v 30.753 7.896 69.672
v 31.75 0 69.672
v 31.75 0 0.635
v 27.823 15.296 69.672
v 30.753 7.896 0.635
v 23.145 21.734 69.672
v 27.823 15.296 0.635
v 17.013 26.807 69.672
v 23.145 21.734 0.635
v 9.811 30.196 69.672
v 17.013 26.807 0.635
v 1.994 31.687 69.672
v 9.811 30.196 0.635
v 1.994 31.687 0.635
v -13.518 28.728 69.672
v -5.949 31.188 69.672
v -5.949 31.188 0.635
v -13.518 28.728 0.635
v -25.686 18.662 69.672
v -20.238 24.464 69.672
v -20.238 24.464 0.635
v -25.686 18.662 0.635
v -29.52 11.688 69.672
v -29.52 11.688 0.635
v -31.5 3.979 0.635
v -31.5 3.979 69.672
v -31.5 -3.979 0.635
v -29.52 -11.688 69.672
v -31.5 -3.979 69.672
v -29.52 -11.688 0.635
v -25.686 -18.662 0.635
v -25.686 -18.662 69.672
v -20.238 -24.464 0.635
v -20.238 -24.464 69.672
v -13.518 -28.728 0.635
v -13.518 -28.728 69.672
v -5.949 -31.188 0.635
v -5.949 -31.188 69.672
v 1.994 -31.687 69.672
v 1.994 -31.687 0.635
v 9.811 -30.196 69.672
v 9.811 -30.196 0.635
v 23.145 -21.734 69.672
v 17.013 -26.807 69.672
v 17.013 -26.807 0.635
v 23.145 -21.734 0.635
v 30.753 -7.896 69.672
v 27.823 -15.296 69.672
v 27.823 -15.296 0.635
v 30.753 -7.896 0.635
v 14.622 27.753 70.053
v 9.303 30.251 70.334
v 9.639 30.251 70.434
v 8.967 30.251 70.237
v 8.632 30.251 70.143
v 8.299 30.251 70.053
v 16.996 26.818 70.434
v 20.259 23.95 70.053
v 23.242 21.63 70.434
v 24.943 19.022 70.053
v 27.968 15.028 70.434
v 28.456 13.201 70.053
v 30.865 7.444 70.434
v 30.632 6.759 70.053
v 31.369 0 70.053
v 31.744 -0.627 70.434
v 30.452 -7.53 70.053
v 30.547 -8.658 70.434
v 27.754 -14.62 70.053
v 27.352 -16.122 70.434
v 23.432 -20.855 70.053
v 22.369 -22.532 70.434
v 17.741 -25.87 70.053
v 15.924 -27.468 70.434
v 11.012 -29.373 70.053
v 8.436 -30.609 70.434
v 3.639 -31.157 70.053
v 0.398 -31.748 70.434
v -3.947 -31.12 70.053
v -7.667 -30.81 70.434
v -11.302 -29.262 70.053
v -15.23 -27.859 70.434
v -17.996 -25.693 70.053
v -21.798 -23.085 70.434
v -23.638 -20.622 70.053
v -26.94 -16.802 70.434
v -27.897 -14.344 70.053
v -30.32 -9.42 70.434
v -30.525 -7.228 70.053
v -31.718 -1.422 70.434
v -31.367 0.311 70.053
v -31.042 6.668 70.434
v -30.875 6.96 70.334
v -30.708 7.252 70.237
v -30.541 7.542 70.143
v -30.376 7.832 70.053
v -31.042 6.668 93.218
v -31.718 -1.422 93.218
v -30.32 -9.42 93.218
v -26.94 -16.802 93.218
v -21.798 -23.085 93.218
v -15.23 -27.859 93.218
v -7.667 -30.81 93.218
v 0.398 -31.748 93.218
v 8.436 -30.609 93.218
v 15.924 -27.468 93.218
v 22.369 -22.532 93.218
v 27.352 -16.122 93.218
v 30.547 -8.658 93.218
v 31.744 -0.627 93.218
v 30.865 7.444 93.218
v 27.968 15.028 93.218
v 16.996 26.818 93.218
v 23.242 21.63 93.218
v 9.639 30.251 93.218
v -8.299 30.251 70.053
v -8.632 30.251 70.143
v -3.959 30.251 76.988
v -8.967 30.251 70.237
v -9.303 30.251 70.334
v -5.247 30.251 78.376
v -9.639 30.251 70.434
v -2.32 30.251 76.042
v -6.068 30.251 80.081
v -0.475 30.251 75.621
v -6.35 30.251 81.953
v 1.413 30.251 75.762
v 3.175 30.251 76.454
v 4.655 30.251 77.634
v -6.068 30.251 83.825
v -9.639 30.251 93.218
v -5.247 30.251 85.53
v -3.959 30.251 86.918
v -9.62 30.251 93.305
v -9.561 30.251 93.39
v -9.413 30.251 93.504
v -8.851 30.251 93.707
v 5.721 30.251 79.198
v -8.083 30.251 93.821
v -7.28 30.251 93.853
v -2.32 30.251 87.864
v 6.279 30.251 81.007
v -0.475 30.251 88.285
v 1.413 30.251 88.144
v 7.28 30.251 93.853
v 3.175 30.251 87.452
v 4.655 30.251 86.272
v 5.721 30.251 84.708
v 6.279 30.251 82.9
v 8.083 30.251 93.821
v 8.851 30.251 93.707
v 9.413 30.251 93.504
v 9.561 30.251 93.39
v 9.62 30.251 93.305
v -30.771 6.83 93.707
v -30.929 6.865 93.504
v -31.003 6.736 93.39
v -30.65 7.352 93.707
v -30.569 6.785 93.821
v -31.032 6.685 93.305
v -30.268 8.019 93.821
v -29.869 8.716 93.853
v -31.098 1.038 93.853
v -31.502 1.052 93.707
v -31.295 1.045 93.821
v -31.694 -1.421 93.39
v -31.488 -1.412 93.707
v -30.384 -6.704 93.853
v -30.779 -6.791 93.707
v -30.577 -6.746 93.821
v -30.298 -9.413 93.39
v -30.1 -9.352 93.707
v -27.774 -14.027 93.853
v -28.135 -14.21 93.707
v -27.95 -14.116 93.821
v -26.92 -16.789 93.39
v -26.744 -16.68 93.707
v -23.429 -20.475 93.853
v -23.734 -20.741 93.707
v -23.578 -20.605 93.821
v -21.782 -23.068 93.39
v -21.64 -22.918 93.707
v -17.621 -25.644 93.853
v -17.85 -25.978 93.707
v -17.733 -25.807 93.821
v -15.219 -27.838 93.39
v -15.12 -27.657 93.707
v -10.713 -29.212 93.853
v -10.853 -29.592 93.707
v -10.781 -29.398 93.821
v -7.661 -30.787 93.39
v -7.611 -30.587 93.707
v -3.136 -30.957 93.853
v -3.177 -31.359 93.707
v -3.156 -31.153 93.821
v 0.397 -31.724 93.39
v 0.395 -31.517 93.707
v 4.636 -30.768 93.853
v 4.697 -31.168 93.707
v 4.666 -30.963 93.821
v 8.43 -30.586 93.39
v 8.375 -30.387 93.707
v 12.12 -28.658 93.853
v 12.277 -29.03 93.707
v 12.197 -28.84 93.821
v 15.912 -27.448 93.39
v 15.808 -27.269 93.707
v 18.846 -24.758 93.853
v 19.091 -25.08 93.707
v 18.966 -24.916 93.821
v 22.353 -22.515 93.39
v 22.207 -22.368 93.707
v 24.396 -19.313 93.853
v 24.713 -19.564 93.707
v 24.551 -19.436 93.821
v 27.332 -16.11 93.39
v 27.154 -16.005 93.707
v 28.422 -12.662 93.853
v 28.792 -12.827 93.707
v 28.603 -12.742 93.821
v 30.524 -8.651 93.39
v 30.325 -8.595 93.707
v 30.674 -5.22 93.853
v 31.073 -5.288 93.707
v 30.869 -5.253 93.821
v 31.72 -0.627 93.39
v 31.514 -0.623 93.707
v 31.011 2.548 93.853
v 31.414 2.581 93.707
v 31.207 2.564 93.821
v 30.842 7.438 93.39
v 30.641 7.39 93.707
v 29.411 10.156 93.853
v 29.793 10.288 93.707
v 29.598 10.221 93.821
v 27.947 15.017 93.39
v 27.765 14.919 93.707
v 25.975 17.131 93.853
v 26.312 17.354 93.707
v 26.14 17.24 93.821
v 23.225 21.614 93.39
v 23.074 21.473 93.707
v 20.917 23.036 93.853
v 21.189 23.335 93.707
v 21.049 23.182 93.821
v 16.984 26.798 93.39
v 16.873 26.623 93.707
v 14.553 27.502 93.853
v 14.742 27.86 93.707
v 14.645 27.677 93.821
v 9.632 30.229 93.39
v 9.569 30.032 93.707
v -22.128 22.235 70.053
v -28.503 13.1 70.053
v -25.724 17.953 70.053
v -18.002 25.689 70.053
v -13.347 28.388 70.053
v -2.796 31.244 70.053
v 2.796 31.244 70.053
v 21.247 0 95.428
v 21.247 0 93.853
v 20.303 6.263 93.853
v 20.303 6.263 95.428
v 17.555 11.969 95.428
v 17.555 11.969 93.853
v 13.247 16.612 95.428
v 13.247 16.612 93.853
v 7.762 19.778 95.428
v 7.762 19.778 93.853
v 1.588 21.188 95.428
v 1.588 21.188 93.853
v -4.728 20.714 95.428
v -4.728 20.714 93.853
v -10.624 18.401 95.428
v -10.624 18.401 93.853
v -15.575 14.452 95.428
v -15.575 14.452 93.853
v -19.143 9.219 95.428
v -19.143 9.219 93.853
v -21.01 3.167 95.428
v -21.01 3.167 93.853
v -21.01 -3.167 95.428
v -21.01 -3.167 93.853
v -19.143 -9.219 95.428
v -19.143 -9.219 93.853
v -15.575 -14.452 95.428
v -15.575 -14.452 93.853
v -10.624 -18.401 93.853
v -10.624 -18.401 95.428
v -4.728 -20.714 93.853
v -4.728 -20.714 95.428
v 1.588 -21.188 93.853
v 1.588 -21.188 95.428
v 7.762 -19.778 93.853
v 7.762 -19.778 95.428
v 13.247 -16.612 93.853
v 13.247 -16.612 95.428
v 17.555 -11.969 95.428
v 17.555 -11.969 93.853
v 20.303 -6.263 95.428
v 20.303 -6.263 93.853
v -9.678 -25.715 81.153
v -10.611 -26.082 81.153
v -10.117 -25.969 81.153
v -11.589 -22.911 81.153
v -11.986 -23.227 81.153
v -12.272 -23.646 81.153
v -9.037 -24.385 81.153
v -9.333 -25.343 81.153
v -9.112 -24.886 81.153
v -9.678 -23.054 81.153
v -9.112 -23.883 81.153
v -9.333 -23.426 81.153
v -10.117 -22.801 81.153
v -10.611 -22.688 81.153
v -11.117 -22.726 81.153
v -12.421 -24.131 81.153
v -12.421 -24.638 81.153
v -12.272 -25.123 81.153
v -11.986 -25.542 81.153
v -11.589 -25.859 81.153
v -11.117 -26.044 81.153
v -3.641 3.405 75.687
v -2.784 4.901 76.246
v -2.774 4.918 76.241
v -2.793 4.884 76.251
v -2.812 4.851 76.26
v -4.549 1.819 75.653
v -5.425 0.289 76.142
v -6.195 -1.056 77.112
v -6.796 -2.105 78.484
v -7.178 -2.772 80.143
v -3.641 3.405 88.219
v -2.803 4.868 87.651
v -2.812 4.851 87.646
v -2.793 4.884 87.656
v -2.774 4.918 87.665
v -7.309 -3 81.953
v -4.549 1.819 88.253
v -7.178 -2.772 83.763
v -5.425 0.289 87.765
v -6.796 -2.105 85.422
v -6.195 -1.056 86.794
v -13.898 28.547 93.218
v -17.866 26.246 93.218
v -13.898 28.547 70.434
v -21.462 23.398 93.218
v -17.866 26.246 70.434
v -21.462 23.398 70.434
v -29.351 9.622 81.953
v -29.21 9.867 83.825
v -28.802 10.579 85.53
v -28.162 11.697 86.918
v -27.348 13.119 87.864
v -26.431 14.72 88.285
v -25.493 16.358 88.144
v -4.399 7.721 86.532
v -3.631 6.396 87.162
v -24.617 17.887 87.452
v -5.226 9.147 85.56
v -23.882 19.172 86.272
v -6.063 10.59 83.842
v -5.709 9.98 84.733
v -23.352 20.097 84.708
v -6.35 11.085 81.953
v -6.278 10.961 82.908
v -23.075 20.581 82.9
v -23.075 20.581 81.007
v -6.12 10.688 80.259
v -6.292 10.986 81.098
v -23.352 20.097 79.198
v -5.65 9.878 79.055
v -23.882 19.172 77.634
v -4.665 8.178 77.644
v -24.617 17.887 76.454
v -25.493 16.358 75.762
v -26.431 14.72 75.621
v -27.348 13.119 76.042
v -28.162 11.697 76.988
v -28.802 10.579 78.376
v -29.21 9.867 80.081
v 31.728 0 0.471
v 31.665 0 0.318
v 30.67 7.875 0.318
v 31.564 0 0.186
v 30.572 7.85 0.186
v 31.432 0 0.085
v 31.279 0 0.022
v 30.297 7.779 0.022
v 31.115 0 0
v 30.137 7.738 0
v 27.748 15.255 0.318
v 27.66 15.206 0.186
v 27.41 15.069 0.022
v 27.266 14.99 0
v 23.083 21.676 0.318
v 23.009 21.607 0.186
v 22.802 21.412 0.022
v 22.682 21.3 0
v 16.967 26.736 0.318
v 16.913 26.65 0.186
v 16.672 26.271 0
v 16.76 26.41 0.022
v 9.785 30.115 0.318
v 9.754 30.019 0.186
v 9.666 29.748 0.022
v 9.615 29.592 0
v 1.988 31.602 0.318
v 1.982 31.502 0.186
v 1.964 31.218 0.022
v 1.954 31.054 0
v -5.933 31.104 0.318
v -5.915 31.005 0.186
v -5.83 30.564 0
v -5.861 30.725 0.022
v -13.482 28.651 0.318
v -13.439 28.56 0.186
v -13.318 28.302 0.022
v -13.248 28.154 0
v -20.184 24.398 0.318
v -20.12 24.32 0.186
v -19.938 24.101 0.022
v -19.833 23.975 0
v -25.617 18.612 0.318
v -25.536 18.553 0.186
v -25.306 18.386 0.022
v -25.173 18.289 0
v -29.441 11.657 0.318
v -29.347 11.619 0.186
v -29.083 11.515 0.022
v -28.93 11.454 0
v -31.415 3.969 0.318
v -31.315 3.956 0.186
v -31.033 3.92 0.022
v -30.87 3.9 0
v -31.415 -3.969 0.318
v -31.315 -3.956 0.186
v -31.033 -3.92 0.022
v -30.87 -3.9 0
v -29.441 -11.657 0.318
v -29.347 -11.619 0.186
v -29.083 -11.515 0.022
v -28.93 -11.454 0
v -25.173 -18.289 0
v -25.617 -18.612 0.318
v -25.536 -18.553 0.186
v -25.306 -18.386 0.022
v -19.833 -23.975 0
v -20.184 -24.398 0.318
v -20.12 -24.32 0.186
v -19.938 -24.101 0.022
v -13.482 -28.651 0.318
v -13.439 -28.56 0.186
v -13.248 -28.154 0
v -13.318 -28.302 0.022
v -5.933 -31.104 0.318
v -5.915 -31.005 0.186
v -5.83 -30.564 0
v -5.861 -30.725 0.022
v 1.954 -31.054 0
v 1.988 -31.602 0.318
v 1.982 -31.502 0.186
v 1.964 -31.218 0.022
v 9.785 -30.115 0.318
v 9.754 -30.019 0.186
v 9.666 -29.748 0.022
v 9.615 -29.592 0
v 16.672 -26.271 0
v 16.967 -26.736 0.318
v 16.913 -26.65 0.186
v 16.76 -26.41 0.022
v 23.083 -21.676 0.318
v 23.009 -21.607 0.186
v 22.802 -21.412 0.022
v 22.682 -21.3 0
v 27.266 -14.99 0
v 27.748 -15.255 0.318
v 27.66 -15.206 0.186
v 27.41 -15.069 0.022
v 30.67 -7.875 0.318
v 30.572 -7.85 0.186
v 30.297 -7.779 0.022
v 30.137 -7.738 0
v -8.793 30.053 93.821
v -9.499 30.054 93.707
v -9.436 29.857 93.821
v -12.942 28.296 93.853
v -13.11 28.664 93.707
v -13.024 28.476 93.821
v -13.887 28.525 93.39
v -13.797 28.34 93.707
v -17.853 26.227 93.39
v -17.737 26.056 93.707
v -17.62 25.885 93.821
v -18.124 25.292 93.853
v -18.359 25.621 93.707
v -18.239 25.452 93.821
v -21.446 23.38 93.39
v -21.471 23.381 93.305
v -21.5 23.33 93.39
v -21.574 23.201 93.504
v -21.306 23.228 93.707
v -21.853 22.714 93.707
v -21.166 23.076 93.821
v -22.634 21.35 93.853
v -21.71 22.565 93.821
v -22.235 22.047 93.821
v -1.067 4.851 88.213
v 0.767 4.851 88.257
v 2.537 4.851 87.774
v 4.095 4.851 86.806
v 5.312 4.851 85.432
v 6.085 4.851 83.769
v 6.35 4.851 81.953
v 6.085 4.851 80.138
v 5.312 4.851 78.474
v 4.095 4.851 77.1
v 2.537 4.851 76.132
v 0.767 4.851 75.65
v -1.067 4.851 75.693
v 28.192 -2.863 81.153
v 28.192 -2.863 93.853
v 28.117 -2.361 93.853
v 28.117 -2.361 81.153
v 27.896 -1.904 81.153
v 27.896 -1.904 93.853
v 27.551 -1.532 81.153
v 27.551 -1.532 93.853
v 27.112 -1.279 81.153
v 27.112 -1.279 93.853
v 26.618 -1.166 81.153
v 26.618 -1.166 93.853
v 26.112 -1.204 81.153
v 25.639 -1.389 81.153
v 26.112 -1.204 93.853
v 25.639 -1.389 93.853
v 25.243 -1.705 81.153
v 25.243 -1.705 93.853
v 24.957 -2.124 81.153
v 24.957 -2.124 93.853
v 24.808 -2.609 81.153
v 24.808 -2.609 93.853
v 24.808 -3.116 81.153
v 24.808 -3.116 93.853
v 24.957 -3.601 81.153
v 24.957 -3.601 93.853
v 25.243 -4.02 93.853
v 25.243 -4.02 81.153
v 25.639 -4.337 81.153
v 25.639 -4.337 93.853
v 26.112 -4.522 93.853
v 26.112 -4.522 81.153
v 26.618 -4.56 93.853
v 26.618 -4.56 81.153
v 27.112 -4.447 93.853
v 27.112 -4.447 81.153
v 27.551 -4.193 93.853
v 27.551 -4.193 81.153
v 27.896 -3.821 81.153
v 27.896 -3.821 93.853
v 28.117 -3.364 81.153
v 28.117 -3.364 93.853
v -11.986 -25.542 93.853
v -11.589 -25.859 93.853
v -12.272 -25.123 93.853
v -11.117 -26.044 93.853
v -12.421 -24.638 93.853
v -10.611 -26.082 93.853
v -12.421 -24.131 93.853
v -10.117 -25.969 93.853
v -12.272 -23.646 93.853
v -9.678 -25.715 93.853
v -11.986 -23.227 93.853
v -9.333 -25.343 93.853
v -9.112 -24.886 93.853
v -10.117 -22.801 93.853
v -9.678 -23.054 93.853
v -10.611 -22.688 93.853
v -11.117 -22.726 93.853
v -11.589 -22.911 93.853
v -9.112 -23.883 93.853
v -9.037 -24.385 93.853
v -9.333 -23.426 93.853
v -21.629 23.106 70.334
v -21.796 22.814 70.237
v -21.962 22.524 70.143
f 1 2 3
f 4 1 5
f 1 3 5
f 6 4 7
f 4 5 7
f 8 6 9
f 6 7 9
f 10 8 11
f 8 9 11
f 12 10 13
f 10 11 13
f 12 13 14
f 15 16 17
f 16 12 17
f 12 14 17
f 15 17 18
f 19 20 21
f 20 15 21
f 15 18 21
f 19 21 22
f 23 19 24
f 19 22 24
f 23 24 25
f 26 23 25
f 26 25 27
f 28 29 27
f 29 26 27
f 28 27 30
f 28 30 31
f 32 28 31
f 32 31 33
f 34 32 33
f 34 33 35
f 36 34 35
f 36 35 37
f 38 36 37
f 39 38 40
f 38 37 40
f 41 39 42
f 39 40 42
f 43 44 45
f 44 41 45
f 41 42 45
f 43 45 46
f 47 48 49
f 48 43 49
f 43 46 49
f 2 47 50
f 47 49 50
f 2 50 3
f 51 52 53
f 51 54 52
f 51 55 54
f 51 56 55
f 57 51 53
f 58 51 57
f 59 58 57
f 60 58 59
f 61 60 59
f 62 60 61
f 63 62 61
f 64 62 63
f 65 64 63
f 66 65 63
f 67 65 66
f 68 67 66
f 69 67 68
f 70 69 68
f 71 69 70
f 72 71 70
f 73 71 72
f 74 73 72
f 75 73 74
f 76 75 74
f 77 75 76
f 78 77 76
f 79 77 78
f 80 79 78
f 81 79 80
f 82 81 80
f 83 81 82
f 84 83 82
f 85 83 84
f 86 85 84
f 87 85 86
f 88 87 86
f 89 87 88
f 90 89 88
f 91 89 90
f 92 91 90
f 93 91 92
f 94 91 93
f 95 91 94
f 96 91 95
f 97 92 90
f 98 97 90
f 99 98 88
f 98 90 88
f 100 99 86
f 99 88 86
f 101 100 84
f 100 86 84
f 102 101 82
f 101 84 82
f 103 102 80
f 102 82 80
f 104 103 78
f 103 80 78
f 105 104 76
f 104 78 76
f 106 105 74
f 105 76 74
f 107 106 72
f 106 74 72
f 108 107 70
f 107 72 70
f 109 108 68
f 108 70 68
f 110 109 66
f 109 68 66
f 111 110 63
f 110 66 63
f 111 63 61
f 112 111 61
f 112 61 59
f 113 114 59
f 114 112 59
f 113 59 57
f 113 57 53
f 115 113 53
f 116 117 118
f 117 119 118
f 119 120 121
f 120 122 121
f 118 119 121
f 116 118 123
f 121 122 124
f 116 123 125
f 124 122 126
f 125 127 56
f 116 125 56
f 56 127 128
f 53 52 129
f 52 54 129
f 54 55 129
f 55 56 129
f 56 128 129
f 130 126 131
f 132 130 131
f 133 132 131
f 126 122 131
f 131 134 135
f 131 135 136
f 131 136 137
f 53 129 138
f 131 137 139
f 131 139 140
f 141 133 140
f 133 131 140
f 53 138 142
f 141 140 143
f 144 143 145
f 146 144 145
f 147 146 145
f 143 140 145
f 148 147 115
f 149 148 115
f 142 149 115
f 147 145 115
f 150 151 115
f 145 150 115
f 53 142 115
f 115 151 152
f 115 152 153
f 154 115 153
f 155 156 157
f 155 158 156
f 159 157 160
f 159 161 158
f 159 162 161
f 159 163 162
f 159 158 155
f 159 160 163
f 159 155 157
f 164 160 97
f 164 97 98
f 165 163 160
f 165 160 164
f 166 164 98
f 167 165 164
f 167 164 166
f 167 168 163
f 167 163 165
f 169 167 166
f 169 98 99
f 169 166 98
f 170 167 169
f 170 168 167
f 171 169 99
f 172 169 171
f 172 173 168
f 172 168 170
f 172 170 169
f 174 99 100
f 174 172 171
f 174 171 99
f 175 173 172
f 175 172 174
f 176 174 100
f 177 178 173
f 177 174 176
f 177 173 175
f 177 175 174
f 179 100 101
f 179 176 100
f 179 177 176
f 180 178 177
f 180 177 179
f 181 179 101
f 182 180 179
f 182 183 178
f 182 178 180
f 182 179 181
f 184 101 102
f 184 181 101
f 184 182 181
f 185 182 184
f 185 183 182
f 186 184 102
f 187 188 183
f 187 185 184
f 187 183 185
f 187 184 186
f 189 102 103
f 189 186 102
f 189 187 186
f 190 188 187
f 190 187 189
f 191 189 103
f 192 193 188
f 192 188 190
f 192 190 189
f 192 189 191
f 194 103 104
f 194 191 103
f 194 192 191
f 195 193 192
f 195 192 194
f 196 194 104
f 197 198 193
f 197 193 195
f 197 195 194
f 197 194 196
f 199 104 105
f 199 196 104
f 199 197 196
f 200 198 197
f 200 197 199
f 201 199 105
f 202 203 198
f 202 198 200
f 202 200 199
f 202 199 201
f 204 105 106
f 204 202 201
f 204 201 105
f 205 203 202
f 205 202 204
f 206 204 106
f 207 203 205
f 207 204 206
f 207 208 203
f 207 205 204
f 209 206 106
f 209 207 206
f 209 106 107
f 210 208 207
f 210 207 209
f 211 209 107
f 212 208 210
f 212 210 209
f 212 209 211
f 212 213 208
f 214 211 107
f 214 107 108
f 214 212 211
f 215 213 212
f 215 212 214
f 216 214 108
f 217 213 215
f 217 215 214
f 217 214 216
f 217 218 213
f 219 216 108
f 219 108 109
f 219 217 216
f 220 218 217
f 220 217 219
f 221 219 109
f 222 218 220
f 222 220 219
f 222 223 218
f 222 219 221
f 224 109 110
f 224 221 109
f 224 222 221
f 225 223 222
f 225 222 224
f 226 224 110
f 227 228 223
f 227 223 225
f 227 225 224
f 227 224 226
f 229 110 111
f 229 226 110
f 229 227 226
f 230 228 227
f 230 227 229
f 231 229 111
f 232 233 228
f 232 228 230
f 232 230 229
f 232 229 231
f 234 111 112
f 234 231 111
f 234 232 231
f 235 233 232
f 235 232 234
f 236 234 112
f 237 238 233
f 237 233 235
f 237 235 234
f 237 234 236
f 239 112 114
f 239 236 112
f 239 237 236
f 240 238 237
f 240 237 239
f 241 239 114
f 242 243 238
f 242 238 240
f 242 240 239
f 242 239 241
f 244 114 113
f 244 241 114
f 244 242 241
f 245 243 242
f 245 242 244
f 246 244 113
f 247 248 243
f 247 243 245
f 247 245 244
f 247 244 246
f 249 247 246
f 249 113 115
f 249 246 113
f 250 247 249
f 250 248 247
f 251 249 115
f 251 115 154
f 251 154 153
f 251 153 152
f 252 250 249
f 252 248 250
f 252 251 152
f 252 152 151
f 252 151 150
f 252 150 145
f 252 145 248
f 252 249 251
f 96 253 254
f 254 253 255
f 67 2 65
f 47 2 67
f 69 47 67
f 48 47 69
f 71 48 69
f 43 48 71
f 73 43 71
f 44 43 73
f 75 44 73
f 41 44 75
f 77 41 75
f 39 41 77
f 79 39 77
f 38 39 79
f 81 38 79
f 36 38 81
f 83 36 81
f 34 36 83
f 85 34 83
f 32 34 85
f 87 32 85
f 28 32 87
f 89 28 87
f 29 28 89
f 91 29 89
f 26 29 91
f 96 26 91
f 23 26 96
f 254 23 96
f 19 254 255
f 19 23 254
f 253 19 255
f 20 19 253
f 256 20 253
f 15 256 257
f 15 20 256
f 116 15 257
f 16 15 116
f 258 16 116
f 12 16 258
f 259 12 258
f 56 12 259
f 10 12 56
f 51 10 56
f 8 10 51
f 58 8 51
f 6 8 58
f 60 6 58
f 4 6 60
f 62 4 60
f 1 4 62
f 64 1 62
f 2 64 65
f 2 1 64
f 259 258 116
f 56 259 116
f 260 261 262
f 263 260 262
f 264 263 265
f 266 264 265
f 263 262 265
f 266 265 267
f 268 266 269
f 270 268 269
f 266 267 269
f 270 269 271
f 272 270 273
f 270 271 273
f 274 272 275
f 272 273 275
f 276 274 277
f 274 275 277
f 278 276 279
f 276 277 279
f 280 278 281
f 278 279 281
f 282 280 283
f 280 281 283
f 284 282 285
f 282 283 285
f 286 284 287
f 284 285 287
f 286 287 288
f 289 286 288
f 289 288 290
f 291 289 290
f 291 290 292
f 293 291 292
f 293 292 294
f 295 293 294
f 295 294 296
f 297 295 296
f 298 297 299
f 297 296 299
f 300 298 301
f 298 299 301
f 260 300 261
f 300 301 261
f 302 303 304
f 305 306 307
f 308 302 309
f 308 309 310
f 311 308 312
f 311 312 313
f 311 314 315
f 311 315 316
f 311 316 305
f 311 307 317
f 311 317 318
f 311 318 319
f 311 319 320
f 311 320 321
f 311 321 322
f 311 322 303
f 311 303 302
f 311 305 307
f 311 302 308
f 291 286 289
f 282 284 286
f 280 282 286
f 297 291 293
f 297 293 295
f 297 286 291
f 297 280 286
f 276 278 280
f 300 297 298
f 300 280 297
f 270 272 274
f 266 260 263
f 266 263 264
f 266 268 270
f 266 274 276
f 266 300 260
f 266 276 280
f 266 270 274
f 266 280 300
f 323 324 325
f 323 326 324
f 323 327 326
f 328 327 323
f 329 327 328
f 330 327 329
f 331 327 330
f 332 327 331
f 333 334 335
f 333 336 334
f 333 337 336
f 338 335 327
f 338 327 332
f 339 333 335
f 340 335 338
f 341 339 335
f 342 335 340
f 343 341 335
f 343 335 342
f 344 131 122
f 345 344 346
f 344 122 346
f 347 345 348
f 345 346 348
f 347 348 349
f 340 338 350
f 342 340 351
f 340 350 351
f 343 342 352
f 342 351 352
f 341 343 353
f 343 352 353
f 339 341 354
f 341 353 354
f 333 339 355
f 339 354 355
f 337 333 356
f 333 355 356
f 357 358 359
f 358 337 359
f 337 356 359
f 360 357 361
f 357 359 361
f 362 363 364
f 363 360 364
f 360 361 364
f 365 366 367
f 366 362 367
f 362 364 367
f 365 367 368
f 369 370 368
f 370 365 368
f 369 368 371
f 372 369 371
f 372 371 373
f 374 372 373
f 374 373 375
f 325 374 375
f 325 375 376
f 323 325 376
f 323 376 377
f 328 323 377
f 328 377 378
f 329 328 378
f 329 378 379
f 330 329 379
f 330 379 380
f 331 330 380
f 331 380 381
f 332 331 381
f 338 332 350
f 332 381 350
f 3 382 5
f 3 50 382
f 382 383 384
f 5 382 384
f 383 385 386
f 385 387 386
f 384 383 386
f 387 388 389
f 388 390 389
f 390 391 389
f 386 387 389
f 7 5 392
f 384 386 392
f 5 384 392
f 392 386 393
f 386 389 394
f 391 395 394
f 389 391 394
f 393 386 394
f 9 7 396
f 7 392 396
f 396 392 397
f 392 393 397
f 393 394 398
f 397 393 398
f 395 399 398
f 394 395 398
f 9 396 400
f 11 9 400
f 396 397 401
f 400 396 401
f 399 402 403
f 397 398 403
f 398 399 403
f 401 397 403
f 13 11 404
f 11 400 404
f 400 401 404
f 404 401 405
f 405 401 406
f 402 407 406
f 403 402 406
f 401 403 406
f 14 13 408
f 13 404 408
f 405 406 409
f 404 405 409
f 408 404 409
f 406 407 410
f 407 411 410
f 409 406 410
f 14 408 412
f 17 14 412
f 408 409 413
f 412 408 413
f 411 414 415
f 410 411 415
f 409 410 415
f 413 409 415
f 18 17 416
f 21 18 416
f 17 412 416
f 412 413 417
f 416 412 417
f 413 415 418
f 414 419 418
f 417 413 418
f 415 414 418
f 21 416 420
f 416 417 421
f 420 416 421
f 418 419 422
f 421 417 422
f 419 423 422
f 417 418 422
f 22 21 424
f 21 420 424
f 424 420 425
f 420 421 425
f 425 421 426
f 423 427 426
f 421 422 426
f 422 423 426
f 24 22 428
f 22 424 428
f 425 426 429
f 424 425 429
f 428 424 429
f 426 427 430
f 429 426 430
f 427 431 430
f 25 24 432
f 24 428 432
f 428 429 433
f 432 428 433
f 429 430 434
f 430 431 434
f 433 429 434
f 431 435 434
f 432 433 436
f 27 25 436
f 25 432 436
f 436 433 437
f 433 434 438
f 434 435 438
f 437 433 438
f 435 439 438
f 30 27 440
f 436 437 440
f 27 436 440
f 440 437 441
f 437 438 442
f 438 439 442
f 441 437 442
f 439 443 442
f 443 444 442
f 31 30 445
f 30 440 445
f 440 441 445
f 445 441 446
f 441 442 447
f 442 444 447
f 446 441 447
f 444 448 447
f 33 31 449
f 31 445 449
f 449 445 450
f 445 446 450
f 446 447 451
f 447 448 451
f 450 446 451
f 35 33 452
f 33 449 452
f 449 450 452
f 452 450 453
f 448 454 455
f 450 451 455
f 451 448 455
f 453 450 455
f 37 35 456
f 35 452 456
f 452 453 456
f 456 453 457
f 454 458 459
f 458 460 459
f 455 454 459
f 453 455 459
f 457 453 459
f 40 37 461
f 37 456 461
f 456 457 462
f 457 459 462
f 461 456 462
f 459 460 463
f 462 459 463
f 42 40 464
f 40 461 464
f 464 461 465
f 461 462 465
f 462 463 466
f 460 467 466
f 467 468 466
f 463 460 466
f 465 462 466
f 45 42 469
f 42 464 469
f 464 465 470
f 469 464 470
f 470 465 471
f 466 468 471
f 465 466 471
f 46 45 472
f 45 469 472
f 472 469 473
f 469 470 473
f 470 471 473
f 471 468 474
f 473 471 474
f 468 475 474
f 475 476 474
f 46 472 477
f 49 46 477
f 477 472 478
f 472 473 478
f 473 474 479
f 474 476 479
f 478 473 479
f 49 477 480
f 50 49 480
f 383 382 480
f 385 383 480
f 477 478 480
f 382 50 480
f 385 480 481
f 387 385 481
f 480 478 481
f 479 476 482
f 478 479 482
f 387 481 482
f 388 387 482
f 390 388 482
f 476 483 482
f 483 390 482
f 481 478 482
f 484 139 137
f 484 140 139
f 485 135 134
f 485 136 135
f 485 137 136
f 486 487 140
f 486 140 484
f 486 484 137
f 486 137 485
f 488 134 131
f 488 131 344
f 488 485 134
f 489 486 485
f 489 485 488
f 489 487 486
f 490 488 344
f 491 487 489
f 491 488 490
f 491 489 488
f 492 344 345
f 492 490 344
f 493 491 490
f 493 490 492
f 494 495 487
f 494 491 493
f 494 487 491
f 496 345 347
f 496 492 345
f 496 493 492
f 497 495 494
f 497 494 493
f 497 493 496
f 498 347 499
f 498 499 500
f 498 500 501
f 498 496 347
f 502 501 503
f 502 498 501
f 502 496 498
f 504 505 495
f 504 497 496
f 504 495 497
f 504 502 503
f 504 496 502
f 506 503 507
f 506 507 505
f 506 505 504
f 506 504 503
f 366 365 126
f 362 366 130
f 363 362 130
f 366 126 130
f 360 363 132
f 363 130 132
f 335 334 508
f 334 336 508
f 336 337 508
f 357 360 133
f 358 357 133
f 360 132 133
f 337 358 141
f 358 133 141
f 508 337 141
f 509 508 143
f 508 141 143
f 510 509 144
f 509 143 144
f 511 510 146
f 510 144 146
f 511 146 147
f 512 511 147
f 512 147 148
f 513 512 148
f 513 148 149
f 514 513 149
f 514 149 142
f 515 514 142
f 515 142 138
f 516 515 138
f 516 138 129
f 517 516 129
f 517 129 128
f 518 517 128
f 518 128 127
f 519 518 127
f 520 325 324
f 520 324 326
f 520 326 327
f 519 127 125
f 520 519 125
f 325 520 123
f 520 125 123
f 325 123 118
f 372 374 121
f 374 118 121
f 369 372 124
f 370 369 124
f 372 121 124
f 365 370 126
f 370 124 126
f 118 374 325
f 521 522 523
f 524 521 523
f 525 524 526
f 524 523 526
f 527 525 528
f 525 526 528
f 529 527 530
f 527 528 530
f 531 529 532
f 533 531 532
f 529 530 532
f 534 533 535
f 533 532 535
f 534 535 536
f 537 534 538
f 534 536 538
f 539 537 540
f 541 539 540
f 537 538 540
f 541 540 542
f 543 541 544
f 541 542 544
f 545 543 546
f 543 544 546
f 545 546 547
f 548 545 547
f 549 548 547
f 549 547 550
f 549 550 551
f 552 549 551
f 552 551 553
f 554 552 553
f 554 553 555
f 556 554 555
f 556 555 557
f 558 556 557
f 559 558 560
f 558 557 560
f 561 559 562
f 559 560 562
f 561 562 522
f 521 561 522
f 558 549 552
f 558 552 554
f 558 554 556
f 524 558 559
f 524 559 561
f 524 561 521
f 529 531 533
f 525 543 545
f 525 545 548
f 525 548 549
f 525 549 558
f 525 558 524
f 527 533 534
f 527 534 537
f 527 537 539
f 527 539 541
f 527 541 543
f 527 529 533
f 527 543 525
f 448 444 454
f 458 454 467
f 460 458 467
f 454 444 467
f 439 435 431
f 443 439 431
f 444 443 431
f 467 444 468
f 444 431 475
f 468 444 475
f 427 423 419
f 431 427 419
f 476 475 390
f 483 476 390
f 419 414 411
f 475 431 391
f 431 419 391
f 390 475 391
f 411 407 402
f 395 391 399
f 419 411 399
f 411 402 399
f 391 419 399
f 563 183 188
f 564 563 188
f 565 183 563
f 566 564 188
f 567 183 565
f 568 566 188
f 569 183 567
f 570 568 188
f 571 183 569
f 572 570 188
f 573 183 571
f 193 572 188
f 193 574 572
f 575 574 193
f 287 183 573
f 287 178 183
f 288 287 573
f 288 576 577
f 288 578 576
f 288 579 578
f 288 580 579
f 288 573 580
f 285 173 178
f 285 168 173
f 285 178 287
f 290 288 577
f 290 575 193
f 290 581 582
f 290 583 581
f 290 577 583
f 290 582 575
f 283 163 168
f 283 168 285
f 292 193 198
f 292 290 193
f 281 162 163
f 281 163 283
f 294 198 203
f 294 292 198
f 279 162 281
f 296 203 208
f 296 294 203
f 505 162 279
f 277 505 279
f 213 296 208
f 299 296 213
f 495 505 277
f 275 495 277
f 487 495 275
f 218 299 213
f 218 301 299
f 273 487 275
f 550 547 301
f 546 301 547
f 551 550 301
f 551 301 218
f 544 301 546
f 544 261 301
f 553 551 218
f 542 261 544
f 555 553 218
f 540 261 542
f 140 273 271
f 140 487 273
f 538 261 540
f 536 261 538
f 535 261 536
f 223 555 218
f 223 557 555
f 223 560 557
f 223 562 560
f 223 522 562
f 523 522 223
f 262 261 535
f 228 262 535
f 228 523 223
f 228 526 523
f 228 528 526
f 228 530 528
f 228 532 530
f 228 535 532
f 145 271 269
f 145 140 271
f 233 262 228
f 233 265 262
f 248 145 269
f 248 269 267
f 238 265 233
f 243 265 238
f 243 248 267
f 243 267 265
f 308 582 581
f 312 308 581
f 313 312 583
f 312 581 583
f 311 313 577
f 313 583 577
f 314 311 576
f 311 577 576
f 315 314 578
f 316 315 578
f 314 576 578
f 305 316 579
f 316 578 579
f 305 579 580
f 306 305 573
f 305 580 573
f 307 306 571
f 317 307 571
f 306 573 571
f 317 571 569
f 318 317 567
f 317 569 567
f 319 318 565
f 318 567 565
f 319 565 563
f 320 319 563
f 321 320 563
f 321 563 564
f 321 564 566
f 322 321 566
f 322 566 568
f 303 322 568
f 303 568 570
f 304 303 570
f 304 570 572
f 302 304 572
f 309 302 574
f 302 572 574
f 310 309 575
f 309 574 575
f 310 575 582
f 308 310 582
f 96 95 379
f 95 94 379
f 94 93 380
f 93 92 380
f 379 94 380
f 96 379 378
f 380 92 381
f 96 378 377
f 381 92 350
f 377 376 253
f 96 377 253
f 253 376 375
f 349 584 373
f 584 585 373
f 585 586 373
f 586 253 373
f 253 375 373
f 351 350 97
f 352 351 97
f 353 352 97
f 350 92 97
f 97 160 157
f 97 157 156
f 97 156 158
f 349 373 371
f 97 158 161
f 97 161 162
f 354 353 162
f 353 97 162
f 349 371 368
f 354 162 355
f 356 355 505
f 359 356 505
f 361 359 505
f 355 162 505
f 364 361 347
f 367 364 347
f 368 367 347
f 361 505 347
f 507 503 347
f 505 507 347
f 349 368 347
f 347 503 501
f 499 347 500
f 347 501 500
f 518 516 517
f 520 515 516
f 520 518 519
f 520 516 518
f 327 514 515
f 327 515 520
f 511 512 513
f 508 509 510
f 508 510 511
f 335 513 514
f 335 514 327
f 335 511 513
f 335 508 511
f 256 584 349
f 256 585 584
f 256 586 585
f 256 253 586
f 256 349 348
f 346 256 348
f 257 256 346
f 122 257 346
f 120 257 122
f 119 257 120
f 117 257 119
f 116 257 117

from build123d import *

# Parameters (mm, degrees)
F0_R      = 31.75
F1_DEPTH  = 93.853
F2_R      = 21.2471
F3_DEPTH  = 1.5748
F5_DEPTH  = 23.7998
F7_DEPTH  = 23.7998
F8_R      = 1.7018
F9_DEPTH  = 12.7
F10_DEPTH = 12.7
F11_R     = 0.635
F12_R     = 0.635
F13_R     = 0.635
F14_R     = 6.35
F15_DEPTH = 25.4
F16_R     = 6.35
F17_DEPTH = 25.4


with BuildPart() as f1:
    # F0 (on Top) → F1 (new body)
    with BuildSketch(Plane.XY):
        Circle(F0_R)
    extrude(amount=F1_DEPTH)

    # F2 (on face) → F3 (join)
    with BuildSketch(Plane.XY.offset(93.853)):
        Circle(F2_R)
    extrude(amount=F3_DEPTH)

    # F4 (on face) → F5 (cut)
    with BuildSketch(Plane.XY.offset(93.853)):
        with BuildLine():
            Line((-9.6392581686, 30.2514), (9.6392581686, 30.2514))
            ThreePointArc((9.6392581686, 30.2514), (0, 31.75), (-9.6392581686, 30.2514))
        make_face()
    extrude(amount=-F5_DEPTH, mode=Mode.SUBTRACT)

    # F6 (on face) → F7 (cut, through all)
    with BuildSketch(Plane.XY.offset(93.853)):
        with BuildLine():
            Line((-31.0418451257, 6.6683094701), (-21.4615892087, 23.397920605))
            ThreePointArc((-21.4615892087, 23.397920605), (-27.5521800663, 15.7778285449), (-31.0418451257, 6.6683094701))
        make_face()
    extrude(amount=-F7_DEPTH, mode=Mode.SUBTRACT)

    # F8 (on face) → F9 (cut)
    with BuildSketch(Plane.XY.offset(93.853)):
        with Locations((-10.738599221, -24.3847738544)):
            Circle(F8_R)
    extrude(amount=-F9_DEPTH, mode=Mode.SUBTRACT)

    # F8 (on face) → F10 (cut)
    with BuildSketch(Plane.XY.offset(93.853)):
        with Locations((26.4903553103, -2.8628280933)):
            Circle(F8_R)
    extrude(amount=-F10_DEPTH, mode=Mode.SUBTRACT)

    # F11
    f11_edges = [f1.edges().sort_by_distance(p)[0] for p in [
        (-3.352903, -31.572465, 93.853),
    ]]
    fillet(f11_edges, radius=F11_R)

    # F12
    f12_edges = [f1.edges().sort_by_distance(p)[0] for p in [
        (-15.923512, 27.468241, 93.853),
    ]]
    fillet(f12_edges, radius=F12_R)

    # F13
    f13_edges = [f1.edges().sort_by_distance(p)[0] for p in [
        (-31.75, 0, 0),
    ]]
    fillet(f13_edges, radius=F13_R)

    # F14 (on face) → F15 (cut)
    with BuildSketch(Plane(origin=(0, 30.2514, 0), x_dir=(-1, 0, 0), z_dir=(0, 1, 0))):
        with Locations((0, 81.9531)):
            Circle(F14_R)
    extrude(amount=-F15_DEPTH, mode=Mode.SUBTRACT)

    # F16 (on face) → F17 (cut)
    with BuildSketch(Plane(origin=(-26.2517171672, 15.0331150376, 0), x_dir=(-0.4969394817, -0.8677851989, 0), z_dir=(-0.8677851989, 0.4969394817, 0))):
        with Locations((-0.1142581686, 81.9531)):
            Circle(F16_R)
    extrude(amount=-F17_DEPTH, mode=Mode.SUBTRACT)

    # F20 (on Front) → F21 (revolve, cut)
    with BuildSketch(Plane.XZ):
        Polygon((31.75, 69.6722), (31.75, 70.4342), (31.369, 70.0532), align=None)
    revolve(axis=Axis((0, 0, 0), (0, 0, -1)), mode=Mode.SUBTRACT)


solid = f1.part
